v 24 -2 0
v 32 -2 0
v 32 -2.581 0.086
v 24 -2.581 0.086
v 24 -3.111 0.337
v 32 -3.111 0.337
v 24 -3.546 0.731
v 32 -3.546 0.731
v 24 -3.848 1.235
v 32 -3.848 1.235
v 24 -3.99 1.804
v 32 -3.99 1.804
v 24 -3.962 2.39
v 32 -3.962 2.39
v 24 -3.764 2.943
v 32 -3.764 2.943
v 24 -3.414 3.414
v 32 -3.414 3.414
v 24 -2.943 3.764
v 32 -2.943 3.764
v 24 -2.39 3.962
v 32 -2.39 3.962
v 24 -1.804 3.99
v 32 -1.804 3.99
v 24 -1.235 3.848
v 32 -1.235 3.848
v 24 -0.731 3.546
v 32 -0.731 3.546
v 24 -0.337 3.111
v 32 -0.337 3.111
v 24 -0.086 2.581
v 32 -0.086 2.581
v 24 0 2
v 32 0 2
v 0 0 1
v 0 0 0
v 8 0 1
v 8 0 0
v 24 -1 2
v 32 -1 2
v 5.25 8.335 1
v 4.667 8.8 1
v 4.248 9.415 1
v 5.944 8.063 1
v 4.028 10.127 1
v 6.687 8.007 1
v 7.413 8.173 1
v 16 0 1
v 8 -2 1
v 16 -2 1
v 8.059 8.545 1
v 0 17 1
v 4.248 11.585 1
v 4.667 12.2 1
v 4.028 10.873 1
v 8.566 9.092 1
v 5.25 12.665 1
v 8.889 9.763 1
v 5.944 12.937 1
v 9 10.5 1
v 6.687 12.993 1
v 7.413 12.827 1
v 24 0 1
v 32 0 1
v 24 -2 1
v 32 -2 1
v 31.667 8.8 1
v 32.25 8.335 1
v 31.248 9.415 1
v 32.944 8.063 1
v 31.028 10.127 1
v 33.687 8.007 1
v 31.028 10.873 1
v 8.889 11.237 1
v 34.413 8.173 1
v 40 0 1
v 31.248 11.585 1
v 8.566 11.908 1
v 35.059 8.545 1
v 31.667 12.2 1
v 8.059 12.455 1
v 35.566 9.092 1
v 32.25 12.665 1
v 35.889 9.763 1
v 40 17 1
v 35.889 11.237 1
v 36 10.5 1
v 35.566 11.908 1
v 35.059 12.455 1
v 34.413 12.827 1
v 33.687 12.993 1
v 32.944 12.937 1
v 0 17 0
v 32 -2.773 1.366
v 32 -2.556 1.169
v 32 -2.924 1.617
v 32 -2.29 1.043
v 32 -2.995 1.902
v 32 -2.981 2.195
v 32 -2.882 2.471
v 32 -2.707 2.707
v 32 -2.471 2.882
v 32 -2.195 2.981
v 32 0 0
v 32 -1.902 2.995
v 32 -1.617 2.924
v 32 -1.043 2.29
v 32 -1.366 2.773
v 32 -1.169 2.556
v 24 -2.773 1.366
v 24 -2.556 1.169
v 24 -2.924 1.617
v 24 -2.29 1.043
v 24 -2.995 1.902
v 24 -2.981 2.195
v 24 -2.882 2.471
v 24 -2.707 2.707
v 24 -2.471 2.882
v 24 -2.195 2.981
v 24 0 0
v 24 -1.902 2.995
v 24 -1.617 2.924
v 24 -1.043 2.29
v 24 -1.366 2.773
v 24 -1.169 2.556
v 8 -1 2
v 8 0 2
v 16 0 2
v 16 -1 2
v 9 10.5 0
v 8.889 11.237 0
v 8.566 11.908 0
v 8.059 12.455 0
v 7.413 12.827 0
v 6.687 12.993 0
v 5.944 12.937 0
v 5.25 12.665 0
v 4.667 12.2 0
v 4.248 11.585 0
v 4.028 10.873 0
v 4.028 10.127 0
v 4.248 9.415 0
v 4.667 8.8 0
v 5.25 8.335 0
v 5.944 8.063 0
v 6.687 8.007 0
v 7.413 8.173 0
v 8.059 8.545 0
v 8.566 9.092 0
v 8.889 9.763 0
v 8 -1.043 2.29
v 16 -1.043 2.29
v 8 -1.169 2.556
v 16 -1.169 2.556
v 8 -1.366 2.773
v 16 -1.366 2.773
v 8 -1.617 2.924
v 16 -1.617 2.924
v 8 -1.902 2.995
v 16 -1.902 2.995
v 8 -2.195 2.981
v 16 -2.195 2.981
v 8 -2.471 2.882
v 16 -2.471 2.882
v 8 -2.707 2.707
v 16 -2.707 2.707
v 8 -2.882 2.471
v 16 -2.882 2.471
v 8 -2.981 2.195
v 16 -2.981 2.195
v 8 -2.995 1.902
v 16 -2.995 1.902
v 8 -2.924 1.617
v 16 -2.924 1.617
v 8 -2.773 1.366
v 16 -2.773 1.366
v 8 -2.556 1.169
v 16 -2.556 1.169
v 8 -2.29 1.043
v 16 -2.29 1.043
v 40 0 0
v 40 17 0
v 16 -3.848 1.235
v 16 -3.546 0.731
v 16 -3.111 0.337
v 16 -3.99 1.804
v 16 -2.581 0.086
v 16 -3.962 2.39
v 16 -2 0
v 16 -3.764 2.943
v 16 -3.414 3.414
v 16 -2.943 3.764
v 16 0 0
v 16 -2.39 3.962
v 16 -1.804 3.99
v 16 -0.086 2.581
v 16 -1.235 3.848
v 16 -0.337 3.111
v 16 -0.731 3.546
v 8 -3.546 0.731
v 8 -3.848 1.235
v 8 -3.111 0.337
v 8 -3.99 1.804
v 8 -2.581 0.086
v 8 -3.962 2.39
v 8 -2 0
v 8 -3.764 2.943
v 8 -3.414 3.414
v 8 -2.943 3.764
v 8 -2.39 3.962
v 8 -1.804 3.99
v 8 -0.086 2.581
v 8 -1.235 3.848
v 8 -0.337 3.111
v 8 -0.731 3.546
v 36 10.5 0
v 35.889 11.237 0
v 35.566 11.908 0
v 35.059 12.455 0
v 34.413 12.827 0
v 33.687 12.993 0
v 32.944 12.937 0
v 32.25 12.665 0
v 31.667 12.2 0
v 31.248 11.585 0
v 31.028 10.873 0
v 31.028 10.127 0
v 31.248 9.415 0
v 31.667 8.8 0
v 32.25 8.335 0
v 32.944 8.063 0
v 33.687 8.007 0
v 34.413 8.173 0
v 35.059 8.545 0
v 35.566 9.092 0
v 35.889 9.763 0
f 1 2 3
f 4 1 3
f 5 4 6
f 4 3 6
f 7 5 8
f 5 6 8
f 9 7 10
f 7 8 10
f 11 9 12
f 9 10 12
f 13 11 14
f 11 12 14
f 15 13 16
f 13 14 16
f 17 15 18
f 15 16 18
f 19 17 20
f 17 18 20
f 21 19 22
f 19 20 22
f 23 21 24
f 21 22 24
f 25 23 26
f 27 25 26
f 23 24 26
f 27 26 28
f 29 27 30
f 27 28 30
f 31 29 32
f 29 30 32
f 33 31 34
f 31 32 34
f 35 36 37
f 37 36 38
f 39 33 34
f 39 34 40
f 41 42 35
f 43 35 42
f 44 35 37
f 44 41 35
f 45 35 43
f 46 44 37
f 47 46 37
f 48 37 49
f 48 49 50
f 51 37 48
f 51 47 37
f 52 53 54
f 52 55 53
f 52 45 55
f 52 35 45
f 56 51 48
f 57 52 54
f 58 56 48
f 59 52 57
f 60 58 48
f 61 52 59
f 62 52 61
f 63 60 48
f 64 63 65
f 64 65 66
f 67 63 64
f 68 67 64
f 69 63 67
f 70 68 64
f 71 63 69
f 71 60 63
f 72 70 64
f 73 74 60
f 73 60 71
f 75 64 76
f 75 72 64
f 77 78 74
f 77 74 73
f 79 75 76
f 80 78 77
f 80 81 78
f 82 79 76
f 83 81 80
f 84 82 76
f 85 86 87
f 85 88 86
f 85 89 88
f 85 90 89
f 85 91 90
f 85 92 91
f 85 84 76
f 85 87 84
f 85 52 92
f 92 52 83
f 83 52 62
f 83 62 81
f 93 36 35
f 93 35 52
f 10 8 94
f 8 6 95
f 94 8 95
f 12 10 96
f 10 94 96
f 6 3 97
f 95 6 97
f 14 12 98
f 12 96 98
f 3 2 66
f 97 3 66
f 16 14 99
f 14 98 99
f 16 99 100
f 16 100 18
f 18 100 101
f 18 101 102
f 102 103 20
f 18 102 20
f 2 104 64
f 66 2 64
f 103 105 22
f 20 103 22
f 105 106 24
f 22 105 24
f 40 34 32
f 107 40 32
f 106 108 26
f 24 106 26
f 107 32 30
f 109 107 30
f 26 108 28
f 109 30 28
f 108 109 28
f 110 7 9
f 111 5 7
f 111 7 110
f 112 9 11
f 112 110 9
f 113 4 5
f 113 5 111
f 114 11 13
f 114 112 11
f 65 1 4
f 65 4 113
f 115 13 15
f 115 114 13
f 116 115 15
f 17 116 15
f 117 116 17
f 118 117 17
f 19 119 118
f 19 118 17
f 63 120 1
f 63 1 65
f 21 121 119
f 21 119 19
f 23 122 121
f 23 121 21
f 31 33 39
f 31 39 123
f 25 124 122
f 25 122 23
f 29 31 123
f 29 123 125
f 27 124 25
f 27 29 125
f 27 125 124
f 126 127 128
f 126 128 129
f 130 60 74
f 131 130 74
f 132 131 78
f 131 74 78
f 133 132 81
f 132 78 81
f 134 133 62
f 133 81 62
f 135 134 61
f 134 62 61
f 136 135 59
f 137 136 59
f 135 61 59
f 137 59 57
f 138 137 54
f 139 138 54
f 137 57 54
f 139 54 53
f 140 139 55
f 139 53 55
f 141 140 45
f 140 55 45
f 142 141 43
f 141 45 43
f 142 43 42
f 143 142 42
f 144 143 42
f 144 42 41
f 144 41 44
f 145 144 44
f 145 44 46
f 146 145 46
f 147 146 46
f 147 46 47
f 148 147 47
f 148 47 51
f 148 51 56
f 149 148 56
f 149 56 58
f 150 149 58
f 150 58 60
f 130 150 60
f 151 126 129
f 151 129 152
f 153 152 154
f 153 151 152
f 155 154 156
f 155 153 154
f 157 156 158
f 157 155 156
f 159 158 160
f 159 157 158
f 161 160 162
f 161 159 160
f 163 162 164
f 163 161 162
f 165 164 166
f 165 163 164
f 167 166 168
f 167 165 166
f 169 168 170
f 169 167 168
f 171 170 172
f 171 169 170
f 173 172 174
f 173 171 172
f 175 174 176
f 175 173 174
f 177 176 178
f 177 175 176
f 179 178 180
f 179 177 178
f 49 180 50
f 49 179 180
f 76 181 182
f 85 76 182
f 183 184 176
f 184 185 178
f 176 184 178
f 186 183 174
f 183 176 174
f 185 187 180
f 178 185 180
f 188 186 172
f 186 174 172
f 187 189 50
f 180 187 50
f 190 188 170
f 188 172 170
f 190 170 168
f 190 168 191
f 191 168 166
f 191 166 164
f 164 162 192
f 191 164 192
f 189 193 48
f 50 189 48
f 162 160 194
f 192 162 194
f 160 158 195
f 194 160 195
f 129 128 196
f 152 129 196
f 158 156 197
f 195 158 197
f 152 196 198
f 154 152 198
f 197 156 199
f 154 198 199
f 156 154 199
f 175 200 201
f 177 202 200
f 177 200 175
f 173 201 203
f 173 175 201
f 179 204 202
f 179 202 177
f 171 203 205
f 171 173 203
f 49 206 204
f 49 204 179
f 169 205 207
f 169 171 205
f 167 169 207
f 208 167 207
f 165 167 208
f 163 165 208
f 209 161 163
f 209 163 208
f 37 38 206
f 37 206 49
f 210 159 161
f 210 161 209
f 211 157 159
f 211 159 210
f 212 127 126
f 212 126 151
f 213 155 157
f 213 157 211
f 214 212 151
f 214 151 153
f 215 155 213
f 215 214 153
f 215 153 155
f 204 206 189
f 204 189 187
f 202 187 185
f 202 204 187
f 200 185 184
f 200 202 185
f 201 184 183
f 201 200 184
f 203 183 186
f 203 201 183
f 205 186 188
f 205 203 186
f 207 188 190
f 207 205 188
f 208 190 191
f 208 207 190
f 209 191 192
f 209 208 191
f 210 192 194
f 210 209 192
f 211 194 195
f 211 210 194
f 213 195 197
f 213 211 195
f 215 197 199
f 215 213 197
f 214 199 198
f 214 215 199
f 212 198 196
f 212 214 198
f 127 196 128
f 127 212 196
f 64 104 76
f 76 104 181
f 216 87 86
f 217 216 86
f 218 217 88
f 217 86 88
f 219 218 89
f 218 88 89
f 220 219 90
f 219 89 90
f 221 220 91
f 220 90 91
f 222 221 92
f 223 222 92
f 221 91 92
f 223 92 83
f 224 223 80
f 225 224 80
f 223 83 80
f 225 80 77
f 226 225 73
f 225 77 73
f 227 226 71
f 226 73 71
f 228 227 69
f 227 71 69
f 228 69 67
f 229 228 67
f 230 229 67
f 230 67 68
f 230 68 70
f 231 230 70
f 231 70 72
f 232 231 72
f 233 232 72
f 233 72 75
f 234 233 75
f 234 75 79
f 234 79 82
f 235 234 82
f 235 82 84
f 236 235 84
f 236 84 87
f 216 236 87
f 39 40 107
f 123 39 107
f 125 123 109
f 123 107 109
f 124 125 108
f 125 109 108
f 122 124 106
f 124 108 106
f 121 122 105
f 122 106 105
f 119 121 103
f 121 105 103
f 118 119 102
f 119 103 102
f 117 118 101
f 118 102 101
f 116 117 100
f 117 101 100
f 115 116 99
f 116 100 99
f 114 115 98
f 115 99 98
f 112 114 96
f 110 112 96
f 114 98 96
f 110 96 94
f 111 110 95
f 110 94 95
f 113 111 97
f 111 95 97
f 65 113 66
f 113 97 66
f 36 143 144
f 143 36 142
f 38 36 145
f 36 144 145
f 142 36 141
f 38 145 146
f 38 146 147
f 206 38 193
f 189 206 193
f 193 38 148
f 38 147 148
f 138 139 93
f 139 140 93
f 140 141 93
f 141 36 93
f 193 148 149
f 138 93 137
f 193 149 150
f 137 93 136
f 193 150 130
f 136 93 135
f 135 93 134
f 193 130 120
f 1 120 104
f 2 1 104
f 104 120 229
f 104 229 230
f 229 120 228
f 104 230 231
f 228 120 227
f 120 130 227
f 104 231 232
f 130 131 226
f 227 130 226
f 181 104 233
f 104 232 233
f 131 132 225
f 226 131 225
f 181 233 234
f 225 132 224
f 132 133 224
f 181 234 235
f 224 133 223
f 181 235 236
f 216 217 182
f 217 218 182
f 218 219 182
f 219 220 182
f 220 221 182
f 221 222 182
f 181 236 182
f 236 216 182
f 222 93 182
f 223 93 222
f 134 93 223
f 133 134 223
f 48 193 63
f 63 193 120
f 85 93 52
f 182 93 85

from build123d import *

# Parameters (mm, degrees)
ESQUISSE1_W             = 40
ESQUISSE1_H             = 17
BOSS_EXTRU_1_DEPTH      = 1
ENL_V_MAT_EXTRU_1_REACH = 45.474
ESQUISSE2_R             = 2.5
BOSS_EXTRU_2_DEPTH      = 8


with BuildPart() as part:
    # Esquisse1 → Boss.-Extru.1 (new body)
    with BuildSketch(Plane.XY):
        with Locations((20, 8.5)):
            Rectangle(ESQUISSE1_W, ESQUISSE1_H)
    extrude(amount=BOSS_EXTRU_1_DEPTH)

    # Esquisse2 → Enlèv. mat.-Extru.1 (cut, up to next)
    with BuildSketch(Plane.XY.offset(1), mode=Mode.PRIVATE) as enl_v_mat_extru_1_sk1:
        with Locations((6.5, 10.5)):
            Circle(ESQUISSE2_R)
    enl_v_mat_extru_1_tool1 = extrude(enl_v_mat_extru_1_sk1.sketch, amount=-ENL_V_MAT_EXTRU_1_REACH, mode=Mode.PRIVATE) & part.part
    # Esquisse2 → Enlèv. mat.-Extru.1 (cut, up to next)
    with BuildSketch(Plane.XY.offset(1), mode=Mode.PRIVATE) as enl_v_mat_extru_1_sk2:
        with Locations((33.5, 10.5)):
            Circle(ESQUISSE2_R)
    enl_v_mat_extru_1_tool2 = extrude(enl_v_mat_extru_1_sk2.sketch, amount=-ENL_V_MAT_EXTRU_1_REACH, mode=Mode.PRIVATE) & part.part
    add(enl_v_mat_extru_1_tool1.solids().sort_by_distance((6.5, 10.5, 1))[0], mode=Mode.SUBTRACT)
    add(enl_v_mat_extru_1_tool2.solids().sort_by_distance((33.5, 10.5, 1))[0], mode=Mode.SUBTRACT)

    # Esquisse3 → Boss.-Extru.2 (add)
    with BuildSketch(Plane.ZY.offset(-8)):
        with BuildLine():
            Line((0, 0), (0, -2))
            ThreePointArc((0, -2), (3.414213562, -3.414213562), (2, 0))
            Line((2, 0), (2, -1))
            ThreePointArc((2, -1), (2.707106781, -2.707106781), (1, -2))
            Line((1, -2), (1, 0))
            Line((1, 0), (0, 0))
        make_face()
    boss_extru_2 = extrude(amount=-BOSS_EXTRU_2_DEPTH)

    # Symétrie1: Boss.-Extru.2 across plane
    add(boss_extru_2.mirror(Plane.ZY.offset(-20)))


solid = part.part
